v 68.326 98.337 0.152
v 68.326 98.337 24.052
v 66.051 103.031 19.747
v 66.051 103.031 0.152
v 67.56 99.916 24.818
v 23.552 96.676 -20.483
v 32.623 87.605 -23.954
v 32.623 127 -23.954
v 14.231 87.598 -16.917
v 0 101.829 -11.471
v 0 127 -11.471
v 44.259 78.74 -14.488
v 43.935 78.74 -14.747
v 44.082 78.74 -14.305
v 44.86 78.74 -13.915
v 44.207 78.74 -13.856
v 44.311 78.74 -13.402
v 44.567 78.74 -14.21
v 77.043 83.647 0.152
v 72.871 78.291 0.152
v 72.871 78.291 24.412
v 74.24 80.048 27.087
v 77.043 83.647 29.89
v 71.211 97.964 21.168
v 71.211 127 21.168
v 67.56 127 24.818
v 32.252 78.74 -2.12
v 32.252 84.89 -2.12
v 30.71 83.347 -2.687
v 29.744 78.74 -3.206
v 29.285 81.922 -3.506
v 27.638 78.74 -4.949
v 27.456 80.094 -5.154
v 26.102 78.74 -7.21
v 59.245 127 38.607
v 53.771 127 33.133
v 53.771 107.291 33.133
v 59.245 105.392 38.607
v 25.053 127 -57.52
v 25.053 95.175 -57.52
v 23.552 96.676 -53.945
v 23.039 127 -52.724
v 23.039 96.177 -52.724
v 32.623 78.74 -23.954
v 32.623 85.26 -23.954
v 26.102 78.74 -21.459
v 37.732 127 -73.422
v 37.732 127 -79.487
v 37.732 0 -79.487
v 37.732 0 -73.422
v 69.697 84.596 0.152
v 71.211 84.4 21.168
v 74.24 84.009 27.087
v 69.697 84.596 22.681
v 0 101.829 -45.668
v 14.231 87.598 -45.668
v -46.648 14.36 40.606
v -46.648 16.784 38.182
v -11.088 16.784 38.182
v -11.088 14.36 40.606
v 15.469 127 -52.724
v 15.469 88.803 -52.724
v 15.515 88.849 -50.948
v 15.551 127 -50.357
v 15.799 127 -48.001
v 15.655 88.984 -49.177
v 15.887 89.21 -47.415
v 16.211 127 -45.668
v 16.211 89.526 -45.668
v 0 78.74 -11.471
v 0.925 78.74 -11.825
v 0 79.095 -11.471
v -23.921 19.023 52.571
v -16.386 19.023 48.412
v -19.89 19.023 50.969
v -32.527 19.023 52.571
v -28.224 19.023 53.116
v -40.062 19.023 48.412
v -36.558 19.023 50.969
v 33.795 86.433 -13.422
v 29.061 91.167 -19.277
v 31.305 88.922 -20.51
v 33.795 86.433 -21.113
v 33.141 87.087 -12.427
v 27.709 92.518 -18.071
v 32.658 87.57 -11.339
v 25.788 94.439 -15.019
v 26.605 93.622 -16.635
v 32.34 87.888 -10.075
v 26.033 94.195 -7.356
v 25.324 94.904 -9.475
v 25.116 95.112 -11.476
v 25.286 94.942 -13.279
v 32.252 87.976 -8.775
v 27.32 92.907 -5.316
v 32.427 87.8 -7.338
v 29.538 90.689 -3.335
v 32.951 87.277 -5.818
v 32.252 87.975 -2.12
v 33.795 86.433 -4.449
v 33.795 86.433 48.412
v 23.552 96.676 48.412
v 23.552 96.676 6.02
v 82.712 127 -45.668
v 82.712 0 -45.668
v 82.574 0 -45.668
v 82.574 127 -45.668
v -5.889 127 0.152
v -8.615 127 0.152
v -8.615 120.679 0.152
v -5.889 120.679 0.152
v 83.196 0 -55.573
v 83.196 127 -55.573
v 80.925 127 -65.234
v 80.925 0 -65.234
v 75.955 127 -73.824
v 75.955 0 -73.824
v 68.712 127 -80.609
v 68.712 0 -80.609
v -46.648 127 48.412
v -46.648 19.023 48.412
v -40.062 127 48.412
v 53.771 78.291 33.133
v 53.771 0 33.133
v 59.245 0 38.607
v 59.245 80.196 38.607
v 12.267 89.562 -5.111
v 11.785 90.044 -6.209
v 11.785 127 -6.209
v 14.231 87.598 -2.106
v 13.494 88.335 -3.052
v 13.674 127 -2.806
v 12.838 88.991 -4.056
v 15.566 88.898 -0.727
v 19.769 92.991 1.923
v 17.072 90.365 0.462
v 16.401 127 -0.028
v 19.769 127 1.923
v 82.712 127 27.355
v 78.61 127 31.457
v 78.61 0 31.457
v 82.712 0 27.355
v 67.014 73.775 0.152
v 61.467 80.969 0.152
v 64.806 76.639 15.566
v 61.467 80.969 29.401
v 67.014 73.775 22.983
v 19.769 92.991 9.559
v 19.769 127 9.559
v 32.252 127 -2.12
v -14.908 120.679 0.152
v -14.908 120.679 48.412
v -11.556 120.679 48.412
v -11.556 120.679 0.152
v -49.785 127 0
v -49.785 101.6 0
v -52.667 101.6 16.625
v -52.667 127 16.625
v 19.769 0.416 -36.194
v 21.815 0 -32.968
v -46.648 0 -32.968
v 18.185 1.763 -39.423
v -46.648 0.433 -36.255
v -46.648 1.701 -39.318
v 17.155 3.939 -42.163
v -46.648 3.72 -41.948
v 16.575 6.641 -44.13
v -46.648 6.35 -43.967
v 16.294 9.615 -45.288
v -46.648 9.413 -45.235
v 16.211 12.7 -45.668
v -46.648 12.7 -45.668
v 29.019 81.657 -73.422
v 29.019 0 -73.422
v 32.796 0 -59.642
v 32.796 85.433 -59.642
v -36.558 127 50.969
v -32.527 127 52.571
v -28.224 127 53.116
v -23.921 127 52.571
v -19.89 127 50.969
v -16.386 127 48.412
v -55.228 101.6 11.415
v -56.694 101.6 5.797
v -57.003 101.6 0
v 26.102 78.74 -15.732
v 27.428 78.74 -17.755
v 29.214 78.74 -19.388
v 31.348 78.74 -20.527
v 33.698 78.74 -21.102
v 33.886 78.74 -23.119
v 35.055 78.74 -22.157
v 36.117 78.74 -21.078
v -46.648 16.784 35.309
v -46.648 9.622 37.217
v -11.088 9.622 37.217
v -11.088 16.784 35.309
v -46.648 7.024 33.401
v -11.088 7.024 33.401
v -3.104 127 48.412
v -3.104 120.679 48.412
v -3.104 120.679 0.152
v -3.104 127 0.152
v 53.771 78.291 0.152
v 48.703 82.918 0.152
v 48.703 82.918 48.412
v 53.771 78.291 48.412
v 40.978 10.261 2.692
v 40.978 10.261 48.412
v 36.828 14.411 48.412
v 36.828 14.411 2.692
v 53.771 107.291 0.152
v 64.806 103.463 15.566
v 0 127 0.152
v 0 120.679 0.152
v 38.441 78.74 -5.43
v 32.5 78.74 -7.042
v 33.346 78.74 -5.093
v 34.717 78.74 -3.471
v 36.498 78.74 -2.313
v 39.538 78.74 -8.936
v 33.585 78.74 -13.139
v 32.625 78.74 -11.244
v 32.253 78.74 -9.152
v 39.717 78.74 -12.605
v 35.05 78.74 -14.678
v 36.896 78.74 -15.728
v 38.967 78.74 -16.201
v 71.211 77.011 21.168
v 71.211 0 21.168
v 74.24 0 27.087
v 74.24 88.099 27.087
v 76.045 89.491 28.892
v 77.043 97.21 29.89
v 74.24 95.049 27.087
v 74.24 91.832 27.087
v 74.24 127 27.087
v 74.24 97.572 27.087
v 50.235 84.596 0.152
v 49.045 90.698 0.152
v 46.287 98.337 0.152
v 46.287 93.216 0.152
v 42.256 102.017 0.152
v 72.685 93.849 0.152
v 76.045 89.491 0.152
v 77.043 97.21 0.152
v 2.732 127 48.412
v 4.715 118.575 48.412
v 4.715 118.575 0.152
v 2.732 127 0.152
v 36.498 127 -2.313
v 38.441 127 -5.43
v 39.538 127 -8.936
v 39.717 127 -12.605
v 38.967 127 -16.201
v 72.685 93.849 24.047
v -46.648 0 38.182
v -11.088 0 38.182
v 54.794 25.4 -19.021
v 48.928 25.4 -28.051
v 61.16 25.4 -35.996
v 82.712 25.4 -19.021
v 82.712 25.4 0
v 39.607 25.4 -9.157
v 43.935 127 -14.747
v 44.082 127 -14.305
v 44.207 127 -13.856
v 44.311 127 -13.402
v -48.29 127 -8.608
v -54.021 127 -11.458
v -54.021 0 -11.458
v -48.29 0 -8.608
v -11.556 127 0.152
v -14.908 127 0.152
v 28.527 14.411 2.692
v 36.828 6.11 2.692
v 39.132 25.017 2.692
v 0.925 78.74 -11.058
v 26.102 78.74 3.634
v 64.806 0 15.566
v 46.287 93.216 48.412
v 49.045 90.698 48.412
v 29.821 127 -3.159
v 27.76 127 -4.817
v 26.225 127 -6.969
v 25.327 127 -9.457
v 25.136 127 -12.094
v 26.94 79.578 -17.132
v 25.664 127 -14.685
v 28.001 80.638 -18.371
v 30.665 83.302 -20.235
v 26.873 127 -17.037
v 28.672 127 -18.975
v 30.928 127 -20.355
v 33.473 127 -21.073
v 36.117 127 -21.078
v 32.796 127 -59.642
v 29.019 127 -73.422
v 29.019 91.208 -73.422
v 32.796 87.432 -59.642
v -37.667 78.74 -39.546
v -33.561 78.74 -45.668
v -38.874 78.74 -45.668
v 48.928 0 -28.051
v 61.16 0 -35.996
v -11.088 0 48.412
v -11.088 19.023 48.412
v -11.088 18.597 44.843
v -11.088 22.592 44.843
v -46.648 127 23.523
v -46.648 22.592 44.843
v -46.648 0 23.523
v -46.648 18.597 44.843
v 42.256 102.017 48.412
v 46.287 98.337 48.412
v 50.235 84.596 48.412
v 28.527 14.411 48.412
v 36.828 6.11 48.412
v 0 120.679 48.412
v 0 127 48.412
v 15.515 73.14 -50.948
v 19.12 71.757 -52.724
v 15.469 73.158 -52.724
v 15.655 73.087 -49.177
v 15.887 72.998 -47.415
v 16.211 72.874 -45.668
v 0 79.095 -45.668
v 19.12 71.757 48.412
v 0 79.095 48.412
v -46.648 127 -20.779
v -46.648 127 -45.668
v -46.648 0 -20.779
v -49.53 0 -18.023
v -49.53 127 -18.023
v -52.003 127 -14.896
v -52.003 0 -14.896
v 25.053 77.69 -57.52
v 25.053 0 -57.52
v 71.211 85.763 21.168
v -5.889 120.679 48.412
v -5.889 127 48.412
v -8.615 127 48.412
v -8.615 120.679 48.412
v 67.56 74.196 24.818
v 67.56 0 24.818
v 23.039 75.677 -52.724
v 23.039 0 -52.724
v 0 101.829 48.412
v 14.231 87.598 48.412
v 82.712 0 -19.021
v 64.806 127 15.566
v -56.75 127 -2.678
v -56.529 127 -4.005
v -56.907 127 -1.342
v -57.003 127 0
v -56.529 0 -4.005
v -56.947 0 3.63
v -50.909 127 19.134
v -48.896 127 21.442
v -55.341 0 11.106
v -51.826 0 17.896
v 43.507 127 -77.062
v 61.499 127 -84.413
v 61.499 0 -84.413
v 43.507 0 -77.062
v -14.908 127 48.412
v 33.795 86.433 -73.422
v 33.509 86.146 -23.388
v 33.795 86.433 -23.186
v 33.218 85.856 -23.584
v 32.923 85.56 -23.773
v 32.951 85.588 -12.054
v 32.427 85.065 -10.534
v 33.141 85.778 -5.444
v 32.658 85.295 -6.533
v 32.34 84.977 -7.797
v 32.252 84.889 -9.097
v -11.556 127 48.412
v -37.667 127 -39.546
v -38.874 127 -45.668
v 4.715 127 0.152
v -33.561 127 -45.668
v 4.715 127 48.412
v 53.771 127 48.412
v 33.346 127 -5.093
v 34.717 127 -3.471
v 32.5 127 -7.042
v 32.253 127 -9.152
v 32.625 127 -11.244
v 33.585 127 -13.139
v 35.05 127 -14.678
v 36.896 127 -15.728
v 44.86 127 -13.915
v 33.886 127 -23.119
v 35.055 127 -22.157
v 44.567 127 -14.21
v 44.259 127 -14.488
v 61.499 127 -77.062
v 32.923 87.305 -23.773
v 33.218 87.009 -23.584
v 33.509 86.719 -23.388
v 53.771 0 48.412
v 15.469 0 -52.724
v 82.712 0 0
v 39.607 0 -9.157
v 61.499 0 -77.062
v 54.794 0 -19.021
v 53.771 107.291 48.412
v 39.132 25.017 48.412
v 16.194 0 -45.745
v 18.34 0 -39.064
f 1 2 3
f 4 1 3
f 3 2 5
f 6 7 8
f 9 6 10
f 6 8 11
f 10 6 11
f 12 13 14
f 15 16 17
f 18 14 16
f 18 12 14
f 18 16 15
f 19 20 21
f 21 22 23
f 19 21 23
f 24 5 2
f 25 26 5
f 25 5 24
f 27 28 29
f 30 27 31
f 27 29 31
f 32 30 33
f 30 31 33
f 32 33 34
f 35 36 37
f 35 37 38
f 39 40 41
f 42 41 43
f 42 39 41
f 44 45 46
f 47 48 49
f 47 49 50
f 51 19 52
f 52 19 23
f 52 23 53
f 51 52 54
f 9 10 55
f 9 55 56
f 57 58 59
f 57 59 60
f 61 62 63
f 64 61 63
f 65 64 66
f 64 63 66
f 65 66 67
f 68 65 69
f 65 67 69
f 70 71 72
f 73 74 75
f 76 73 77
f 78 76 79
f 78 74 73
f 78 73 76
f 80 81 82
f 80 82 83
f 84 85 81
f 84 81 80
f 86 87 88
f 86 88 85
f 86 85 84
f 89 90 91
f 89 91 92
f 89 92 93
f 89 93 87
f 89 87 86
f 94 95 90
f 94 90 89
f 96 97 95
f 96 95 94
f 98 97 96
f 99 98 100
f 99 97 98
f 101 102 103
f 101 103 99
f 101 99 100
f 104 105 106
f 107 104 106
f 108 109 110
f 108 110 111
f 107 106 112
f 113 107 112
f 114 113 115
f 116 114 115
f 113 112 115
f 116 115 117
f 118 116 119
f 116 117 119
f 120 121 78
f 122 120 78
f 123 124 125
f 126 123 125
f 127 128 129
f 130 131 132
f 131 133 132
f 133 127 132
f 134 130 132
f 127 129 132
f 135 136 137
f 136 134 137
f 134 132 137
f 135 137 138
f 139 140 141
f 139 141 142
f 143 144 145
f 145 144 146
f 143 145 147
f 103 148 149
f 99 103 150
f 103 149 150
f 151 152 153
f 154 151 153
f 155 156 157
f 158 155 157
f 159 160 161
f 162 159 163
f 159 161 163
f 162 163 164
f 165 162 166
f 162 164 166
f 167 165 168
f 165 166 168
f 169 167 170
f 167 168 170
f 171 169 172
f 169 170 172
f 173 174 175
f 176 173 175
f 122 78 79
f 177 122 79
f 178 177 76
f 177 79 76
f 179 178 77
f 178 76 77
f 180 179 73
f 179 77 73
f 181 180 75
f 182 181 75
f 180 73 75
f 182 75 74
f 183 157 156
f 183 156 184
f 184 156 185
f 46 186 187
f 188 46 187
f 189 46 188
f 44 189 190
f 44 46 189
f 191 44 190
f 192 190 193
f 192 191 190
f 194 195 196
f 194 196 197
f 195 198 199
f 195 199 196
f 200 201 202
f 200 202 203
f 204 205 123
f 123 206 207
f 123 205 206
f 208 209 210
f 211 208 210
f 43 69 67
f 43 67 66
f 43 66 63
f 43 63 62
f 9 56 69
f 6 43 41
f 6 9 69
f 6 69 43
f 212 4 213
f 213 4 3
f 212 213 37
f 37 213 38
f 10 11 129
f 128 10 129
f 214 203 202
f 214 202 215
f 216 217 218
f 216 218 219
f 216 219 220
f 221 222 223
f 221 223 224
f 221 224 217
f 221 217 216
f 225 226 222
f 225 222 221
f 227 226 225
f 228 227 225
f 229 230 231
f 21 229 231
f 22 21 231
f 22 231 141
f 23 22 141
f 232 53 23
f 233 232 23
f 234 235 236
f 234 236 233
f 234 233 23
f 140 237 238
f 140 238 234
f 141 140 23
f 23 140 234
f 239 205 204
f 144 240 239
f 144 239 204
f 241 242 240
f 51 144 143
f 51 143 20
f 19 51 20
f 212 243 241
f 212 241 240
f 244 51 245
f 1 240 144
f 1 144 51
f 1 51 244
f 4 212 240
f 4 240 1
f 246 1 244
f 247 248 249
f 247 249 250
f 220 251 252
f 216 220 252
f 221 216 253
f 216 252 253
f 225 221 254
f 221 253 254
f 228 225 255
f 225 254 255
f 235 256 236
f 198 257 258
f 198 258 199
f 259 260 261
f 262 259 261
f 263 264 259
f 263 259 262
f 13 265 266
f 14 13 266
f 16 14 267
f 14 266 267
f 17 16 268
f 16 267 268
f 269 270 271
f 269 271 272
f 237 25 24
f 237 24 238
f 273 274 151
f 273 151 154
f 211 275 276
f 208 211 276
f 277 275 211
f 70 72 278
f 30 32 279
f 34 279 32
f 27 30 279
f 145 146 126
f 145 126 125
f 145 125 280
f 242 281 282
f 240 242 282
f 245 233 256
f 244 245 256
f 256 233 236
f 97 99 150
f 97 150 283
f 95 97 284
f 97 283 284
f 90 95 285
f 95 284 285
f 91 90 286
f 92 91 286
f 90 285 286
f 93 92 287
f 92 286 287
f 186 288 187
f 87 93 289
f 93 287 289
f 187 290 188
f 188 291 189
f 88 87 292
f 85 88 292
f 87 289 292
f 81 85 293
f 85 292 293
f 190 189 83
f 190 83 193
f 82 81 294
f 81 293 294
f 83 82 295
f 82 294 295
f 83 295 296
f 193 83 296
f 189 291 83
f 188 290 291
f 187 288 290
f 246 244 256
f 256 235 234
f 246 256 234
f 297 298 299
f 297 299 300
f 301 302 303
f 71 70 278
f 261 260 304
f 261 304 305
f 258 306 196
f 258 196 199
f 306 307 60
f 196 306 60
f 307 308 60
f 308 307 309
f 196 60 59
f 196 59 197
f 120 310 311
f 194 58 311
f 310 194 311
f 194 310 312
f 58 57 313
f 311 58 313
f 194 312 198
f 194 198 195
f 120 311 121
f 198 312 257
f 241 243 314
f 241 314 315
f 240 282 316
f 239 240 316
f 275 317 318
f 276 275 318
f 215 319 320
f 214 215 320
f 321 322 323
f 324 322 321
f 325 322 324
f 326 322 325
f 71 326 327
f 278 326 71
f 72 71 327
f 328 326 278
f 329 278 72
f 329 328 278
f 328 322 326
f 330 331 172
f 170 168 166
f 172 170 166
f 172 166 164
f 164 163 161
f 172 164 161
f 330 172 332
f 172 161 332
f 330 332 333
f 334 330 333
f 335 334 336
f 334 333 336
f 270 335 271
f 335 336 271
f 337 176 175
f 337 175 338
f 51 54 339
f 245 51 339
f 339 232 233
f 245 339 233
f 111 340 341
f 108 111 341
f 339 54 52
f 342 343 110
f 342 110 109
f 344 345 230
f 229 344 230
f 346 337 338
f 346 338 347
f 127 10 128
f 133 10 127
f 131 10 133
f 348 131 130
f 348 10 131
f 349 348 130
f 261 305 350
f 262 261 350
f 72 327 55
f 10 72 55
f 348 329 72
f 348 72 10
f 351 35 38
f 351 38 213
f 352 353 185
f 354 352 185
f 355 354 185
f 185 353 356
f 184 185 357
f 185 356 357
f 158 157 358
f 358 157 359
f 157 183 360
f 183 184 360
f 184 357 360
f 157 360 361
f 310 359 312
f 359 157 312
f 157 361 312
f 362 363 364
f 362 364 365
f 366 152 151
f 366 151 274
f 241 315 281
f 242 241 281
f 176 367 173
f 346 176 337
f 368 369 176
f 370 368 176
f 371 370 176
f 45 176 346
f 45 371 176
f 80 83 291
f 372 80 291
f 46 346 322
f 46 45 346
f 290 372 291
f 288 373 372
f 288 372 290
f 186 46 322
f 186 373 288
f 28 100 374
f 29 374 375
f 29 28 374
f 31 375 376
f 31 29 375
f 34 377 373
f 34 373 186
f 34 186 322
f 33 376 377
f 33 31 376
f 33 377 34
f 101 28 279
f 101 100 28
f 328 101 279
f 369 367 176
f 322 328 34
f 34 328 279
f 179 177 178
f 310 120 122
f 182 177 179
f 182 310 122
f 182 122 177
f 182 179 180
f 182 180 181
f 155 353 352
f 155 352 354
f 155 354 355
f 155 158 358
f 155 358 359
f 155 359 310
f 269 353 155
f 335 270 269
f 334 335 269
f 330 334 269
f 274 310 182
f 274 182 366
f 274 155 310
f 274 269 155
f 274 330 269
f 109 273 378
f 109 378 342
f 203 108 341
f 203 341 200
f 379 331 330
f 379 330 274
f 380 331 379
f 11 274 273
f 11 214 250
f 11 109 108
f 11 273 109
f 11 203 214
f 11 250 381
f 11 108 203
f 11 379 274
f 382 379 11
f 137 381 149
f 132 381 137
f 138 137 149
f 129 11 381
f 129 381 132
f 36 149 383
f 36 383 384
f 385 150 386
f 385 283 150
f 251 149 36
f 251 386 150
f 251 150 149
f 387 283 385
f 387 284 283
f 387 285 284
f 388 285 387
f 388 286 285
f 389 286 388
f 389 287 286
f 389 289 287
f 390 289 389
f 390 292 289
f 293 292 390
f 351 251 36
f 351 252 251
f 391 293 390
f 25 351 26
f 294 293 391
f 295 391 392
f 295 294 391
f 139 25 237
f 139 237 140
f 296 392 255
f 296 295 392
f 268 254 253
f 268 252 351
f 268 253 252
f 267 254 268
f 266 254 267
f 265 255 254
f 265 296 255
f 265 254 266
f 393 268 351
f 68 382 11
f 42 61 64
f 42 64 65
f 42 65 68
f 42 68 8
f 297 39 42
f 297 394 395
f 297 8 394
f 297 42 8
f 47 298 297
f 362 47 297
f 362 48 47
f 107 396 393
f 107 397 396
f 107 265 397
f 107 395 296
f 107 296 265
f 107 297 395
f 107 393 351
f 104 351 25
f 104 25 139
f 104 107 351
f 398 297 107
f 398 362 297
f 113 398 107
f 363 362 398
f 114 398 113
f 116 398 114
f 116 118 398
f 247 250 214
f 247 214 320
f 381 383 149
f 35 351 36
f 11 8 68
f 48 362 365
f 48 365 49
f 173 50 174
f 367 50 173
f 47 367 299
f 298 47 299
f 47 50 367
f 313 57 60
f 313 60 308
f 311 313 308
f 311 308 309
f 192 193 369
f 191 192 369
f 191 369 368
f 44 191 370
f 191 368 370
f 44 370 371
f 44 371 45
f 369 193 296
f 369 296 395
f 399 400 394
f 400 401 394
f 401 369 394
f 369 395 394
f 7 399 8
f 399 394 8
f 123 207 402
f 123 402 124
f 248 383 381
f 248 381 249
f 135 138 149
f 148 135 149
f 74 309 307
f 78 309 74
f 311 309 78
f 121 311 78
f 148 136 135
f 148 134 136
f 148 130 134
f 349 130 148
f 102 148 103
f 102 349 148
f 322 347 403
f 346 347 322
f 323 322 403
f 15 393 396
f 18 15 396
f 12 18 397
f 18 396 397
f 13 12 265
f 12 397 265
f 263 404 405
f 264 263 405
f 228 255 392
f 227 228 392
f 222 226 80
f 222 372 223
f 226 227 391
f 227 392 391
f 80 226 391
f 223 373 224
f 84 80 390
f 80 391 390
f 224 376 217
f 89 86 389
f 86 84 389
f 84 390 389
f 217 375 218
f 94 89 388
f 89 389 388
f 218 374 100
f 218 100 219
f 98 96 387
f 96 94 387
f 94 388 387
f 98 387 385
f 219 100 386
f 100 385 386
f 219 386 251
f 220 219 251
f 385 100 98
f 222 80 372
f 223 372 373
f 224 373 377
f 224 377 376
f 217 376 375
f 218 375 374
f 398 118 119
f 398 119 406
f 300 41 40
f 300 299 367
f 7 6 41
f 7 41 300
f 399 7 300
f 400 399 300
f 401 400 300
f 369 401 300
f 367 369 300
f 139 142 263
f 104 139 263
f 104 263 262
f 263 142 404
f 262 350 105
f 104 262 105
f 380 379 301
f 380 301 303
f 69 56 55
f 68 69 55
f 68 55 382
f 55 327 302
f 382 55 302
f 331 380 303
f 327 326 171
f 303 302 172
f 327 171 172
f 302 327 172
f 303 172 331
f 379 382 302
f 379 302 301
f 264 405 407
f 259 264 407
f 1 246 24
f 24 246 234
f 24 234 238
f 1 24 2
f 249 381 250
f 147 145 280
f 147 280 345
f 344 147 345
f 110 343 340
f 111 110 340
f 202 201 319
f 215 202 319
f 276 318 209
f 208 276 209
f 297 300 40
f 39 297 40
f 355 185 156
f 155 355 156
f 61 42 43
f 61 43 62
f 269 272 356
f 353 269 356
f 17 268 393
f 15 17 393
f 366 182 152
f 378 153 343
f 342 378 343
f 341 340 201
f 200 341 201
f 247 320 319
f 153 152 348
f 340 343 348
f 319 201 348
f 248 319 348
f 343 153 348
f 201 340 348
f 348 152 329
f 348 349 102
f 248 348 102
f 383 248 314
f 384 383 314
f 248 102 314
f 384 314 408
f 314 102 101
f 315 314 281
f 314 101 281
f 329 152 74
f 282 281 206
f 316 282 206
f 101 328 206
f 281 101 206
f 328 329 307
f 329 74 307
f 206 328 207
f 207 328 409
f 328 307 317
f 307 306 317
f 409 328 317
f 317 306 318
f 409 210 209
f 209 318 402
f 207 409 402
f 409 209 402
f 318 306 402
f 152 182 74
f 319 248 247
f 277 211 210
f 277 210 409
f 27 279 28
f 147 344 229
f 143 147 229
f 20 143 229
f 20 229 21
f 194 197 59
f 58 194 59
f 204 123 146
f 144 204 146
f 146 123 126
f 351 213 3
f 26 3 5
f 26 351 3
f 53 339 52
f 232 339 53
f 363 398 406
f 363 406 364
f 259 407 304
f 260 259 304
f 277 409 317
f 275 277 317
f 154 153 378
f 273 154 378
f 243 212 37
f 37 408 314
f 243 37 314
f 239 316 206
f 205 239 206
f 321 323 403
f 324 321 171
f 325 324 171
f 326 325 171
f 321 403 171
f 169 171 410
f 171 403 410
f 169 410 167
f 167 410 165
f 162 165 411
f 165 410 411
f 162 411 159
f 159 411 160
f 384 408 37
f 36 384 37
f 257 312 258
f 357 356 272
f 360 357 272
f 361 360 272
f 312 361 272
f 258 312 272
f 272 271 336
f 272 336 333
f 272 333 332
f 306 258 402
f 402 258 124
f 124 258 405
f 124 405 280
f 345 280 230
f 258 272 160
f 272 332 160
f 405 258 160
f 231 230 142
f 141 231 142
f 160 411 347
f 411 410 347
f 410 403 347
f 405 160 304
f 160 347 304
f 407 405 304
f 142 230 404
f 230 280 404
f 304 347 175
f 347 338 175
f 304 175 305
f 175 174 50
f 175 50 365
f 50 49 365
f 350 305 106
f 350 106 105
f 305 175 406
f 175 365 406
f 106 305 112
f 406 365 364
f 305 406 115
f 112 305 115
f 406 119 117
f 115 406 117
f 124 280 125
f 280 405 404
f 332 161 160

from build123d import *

# Parameters (mm, degrees)
BOSS_EXTRUDE1_DEPTH = 127
CUT_EXTRUDE1_DEPTH  = 127
CUT_EXTRUDE2_DEPTH  = 127
CUT_EXTRUDE3_DEPTH  = 127
CUT_EXTRUDE4_DEPTH  = 127
CUT_EXTRUDE5_DEPTH  = 35.56
CUT_EXTRUDE6_DEPTH  = 45.72
CUT_EXTRUDE7_DEPTH  = 25.4
CUT_EXTRUDE8_DEPTH  = 25.4
CUT_EXTRUDE9_DEPTH  = 48.26
FILLET2_R           = 12.7
CUT_EXTRUDE10_DEPTH = 48.26
CUT_EXTRUDE11_DEPTH = 48.26
SKETCH13_W          = 3.352326168
SKETCH13_H          = 6.321243204
SKETCH13_W_2        = 2.726283313
SKETCH13_W_3        = 3.104310258
CUT_EXTRUDE12_DEPTH = 48.26


with BuildPart() as part:
    # Sketch1 → Boss-Extrude1 (new body)
    with BuildSketch(Plane(origin=(0, 0, 0), x_dir=(1, 0, 0), z_dir=(0, 1, 0))):
        with BuildLine():
            Line((-46.648149315, -23.52267691), (-46.648149315, -48.412154961))
            Line((-46.648149315, -48.412154961), (-40.062268629, -48.412154961))
            ThreePointArc((-40.062268629, -48.412154961), (-28.224090342, -53.116170018), (-16.385912055, -48.412154961))
            Line((-16.385912055, -48.412154961), (82.712264752, -48.412154961))
            Line((82.712264752, -48.412154961), (82.712264752, 45.668146178))
            Line((82.712264752, 45.668146178), (82.57362293, 45.668146178))
            ThreePointArc((82.57362293, 45.668146178), (49.392158098, 86.647568698), (16.210693266, 45.668146178))
            Line((16.210693266, 45.668146178), (-46.648149315, 45.668146178))
            Line((-46.648149315, 45.668146178), (-46.648149315, 20.778668127))
            ThreePointArc((-46.648149315, 20.778668127), (-57.035515889, -1.372004392), (-46.648149315, -23.52267691))
        make_face()
    extrude(amount=BOSS_EXTRUDE1_DEPTH)

    # Sketch2 → Cut-Extrude1 (cut)
    with BuildSketch(Plane(origin=(0, 127, 0), x_dir=(1, 0, 0), z_dir=(0, 1, 0))):
        Polygon((53.771255125, -48.412154961), (53.771255125, -33.133056701), (59.245344615, -38.607146191), (64.805708774, -15.565956225), (67.56040543, -24.817995886), (71.210896888, -21.167504428), (74.240128171, -27.086551208), (78.610346891, -31.456769928), (82.712264752, -27.354852067), (82.712264752, -48.412154961), align=None)
    extrude(amount=-CUT_EXTRUDE1_DEPTH, mode=Mode.SUBTRACT)

    # Sketch3 → Cut-Extrude2 (cut)
    with BuildSketch(Plane(origin=(0, 127, 0), x_dir=(1, 0, 0), z_dir=(0, 1, 0))):
        Polygon((-54.021260569, 11.457814404), (-48.290157028, 8.607539769), (-56.529413656, 4.004510667), (-59.573272313, 8.607539769), align=None)
    extrude(amount=-CUT_EXTRUDE2_DEPTH, mode=Mode.SUBTRACT)

    # Sketch4 → Cut-Extrude3 (cut)
    with BuildSketch(Plane(origin=(0, 127, 0), x_dir=(1, 0, 0), z_dir=(0, 1, 0))):
        Polygon((68.711913571, 80.608646732), (61.499352783, 77.062236982), (61.499352783, 84.413487152), (43.506651189, 77.062236982), (37.732058212, 79.486880591), (37.732058212, 73.421951288), (29.019187448, 73.421951288), (32.795774648, 59.641721258), (25.052672929, 57.519659523), (23.039136033, 52.724168763), (15.468758164, 52.724168763), (7.703729169, 71.729623121), (36.607461416, 93.948488974), (52.503001986, 98.304794706), (65.105633177, 93.013185532), (69.999007684, 86.647568698), align=None)
    extrude(amount=-CUT_EXTRUDE3_DEPTH, mode=Mode.SUBTRACT)

    # Sketch5 → Cut-Extrude4 (cut)
    with BuildSketch(Plane.XY.offset(48.412154961)):
        Polygon((23.551684909, 96.675783769), (33.794948234, 86.432520444), (19.119619253, 71.757191462), (0, 79.094855953), (0, 101.828672261), (14.231003477, 87.597668784), align=None)
    extrude(amount=-CUT_EXTRUDE4_DEPTH, mode=Mode.SUBTRACT)

    # Sketch6 → Cut-Extrude5 (cut)
    with BuildSketch(Plane.ZY.offset(46.648149315)):
        Polygon((38.182028022, 0), (33.400703039, 7.024347662), (37.217405556, 9.622296393), (35.309054298, 16.783843232), (38.182028022, 16.783843232), (40.605664491, 14.360206762), (44.842860178, 18.597402448), (44.842860178, 22.591859045), (48.412154961, 19.022564262), (59.012556324, 19.022564262), (59.012556324, 0), (48.412154961, 0), align=None)
    extrude(amount=-CUT_EXTRUDE5_DEPTH, mode=Mode.SUBTRACT)

    # Sketch7 → Cut-Extrude6 (cut)
    with BuildSketch(Plane.XY.offset(48.412154961)):
        Polygon((39.132383475, 25.016517963), (28.526826147, 14.410960635), (36.827561927, 6.110224855), (40.977929817, 10.260592745), (36.827561927, 14.410960635), align=None)
    extrude(amount=-CUT_EXTRUDE6_DEPTH, mode=Mode.SUBTRACT)

    # Sketch8 → Cut-Extrude7 (cut)
    with BuildSketch(Plane(origin=(0, 127, 0), x_dir=(1, 0, 0), z_dir=(0, 1, 0))):
        with BuildLine():
            Line((-57.002829821, 0), (-49.785263054, 0))
            Line((-49.785263054, 0), (-52.666628039, -16.625220216))
            ThreePointArc((-52.666628039, -16.625220216), (-57.55914693, -15.494773831), (-62.296457645, -13.829680042))
            Line((-62.296457645, -13.829680042), (-57.002829821, 0))
        make_face()
    extrude(amount=-CUT_EXTRUDE7_DEPTH, mode=Mode.SUBTRACT)

    # Sketch9 → Cut-Extrude8 (cut)
    with BuildSketch(Plane.XZ):
        Polygon((82.712264752, 0), (39.607419236, -9.156647056), (54.793750982, -19.021436188), (48.928269368, -28.051041225), (61.159841994, -35.996467858), (82.712264752, -19.021436188), align=None)
    extrude(amount=-CUT_EXTRUDE8_DEPTH, mode=Mode.SUBTRACT)

    # Sketch10 → Cut-Extrude9 (cut)
    with BuildSketch(Plane.XY.offset(48.412154961)):
        Polygon((53.771255125, 107.29121559), (42.256216165, 102.017164953), (46.287188011, 98.336825396), (46.287188011, 93.216188047), (49.045405549, 90.697892831), (50.235317507, 84.59608405), (48.703232752, 82.918034942), (53.771255125, 78.290852235), (61.466936814, 80.968679424), (67.014073164, 73.774503757), (72.871402474, 78.290852235), (77.043238703, 83.646506612), (69.697413806, 84.59608405), (76.045391143, 89.490751273), (72.68469634, 93.849293635), (77.043238703, 97.209988438), (68.326153978, 98.336825396), (66.050570011, 103.030602234), align=None)
    extrude(amount=-CUT_EXTRUDE9_DEPTH, mode=Mode.SUBTRACT)

    # Fillet2
    fillet2_edges = [part.edges().sort_by_distance(p)[0] for p in [
        (-15.218728024, 0, -45.668146178),
    ]]
    fillet(fillet2_edges, radius=FILLET2_R)

    # Sketch11 → Cut-Extrude10 (cut)
    with BuildSketch(Plane(origin=(0, 127, 0), x_dir=(1, 0, 0), z_dir=(0, 1, 0))):
        Polygon((-33.561061306, 45.668146178), (-37.667043384, 39.545827315), (-38.873955148, 45.668146178), align=None)
    extrude(amount=-CUT_EXTRUDE10_DEPTH, mode=Mode.SUBTRACT)

    # Sketch12 → Cut-Extrude11 (cut)
    with BuildSketch(Plane(origin=(0, 127, 0), x_dir=(1, 0, 0), z_dir=(0, 1, 0))):
        with BuildLine():
            Line((32.62261169, 23.954039897), (0, 11.47123499))
            Line((0, 11.47123499), (11.785114171, 6.209119257))
            ThreePointArc((11.785114171, 6.209119257), (14.943546446, 1.324840992), (19.768883298, -1.922926376))
            Line((19.768883298, -1.922926376), (19.768883298, -9.559025438))
            Line((19.768883298, -9.559025438), (32.25248958, 2.120086108))
            ThreePointArc((32.25248958, 2.120086108), (25.311240294, 13.407729102), (36.117063667, 21.077540525))
            ThreePointArc((36.117063667, 21.077540525), (34.482898742, 22.653139956), (32.62261169, 23.954039897))
        make_face()
        with BuildLine():
            Line((44.311200133, 13.401683946), (44.859521729, 13.914669452))
            ThreePointArc((44.859521729, 13.914669452), (44.41506933, 14.350797491), (43.935008387, 14.747391861))
            ThreePointArc((43.935008387, 14.747391861), (44.147380403, 14.081324283), (44.311200133, 13.401683946))
        make_face()
        with BuildLine():
            ThreePointArc((36.497852258, 2.312544405), (39.537766596, 8.935870024), (38.967288817, 16.201135094))
            ThreePointArc((38.967288817, 16.201135094), (32.362672824, 10.211625014), (36.497852258, 2.312544405))
        make_face()
    extrude(amount=-CUT_EXTRUDE11_DEPTH, mode=Mode.SUBTRACT)

    # Sketch13 → Cut-Extrude12 (cut)
    with BuildSketch(Plane.XY.offset(48.412154961)):
        with Locations((-13.231710861, 123.839378398)):
            Rectangle(SKETCH13_W, SKETCH13_H)
        with Locations((-7.25167366, 123.839378398)):
            Rectangle(SKETCH13_W_2, SKETCH13_H)
        with Locations((-1.552155129, 123.839378398)):
            Rectangle(SKETCH13_W_3, SKETCH13_H)
        Polygon((2.732268262, 127), (4.714756247, 127), (4.714756247, 118.574601007), align=None)
    extrude(amount=-CUT_EXTRUDE12_DEPTH, mode=Mode.SUBTRACT)


solid = part.part
